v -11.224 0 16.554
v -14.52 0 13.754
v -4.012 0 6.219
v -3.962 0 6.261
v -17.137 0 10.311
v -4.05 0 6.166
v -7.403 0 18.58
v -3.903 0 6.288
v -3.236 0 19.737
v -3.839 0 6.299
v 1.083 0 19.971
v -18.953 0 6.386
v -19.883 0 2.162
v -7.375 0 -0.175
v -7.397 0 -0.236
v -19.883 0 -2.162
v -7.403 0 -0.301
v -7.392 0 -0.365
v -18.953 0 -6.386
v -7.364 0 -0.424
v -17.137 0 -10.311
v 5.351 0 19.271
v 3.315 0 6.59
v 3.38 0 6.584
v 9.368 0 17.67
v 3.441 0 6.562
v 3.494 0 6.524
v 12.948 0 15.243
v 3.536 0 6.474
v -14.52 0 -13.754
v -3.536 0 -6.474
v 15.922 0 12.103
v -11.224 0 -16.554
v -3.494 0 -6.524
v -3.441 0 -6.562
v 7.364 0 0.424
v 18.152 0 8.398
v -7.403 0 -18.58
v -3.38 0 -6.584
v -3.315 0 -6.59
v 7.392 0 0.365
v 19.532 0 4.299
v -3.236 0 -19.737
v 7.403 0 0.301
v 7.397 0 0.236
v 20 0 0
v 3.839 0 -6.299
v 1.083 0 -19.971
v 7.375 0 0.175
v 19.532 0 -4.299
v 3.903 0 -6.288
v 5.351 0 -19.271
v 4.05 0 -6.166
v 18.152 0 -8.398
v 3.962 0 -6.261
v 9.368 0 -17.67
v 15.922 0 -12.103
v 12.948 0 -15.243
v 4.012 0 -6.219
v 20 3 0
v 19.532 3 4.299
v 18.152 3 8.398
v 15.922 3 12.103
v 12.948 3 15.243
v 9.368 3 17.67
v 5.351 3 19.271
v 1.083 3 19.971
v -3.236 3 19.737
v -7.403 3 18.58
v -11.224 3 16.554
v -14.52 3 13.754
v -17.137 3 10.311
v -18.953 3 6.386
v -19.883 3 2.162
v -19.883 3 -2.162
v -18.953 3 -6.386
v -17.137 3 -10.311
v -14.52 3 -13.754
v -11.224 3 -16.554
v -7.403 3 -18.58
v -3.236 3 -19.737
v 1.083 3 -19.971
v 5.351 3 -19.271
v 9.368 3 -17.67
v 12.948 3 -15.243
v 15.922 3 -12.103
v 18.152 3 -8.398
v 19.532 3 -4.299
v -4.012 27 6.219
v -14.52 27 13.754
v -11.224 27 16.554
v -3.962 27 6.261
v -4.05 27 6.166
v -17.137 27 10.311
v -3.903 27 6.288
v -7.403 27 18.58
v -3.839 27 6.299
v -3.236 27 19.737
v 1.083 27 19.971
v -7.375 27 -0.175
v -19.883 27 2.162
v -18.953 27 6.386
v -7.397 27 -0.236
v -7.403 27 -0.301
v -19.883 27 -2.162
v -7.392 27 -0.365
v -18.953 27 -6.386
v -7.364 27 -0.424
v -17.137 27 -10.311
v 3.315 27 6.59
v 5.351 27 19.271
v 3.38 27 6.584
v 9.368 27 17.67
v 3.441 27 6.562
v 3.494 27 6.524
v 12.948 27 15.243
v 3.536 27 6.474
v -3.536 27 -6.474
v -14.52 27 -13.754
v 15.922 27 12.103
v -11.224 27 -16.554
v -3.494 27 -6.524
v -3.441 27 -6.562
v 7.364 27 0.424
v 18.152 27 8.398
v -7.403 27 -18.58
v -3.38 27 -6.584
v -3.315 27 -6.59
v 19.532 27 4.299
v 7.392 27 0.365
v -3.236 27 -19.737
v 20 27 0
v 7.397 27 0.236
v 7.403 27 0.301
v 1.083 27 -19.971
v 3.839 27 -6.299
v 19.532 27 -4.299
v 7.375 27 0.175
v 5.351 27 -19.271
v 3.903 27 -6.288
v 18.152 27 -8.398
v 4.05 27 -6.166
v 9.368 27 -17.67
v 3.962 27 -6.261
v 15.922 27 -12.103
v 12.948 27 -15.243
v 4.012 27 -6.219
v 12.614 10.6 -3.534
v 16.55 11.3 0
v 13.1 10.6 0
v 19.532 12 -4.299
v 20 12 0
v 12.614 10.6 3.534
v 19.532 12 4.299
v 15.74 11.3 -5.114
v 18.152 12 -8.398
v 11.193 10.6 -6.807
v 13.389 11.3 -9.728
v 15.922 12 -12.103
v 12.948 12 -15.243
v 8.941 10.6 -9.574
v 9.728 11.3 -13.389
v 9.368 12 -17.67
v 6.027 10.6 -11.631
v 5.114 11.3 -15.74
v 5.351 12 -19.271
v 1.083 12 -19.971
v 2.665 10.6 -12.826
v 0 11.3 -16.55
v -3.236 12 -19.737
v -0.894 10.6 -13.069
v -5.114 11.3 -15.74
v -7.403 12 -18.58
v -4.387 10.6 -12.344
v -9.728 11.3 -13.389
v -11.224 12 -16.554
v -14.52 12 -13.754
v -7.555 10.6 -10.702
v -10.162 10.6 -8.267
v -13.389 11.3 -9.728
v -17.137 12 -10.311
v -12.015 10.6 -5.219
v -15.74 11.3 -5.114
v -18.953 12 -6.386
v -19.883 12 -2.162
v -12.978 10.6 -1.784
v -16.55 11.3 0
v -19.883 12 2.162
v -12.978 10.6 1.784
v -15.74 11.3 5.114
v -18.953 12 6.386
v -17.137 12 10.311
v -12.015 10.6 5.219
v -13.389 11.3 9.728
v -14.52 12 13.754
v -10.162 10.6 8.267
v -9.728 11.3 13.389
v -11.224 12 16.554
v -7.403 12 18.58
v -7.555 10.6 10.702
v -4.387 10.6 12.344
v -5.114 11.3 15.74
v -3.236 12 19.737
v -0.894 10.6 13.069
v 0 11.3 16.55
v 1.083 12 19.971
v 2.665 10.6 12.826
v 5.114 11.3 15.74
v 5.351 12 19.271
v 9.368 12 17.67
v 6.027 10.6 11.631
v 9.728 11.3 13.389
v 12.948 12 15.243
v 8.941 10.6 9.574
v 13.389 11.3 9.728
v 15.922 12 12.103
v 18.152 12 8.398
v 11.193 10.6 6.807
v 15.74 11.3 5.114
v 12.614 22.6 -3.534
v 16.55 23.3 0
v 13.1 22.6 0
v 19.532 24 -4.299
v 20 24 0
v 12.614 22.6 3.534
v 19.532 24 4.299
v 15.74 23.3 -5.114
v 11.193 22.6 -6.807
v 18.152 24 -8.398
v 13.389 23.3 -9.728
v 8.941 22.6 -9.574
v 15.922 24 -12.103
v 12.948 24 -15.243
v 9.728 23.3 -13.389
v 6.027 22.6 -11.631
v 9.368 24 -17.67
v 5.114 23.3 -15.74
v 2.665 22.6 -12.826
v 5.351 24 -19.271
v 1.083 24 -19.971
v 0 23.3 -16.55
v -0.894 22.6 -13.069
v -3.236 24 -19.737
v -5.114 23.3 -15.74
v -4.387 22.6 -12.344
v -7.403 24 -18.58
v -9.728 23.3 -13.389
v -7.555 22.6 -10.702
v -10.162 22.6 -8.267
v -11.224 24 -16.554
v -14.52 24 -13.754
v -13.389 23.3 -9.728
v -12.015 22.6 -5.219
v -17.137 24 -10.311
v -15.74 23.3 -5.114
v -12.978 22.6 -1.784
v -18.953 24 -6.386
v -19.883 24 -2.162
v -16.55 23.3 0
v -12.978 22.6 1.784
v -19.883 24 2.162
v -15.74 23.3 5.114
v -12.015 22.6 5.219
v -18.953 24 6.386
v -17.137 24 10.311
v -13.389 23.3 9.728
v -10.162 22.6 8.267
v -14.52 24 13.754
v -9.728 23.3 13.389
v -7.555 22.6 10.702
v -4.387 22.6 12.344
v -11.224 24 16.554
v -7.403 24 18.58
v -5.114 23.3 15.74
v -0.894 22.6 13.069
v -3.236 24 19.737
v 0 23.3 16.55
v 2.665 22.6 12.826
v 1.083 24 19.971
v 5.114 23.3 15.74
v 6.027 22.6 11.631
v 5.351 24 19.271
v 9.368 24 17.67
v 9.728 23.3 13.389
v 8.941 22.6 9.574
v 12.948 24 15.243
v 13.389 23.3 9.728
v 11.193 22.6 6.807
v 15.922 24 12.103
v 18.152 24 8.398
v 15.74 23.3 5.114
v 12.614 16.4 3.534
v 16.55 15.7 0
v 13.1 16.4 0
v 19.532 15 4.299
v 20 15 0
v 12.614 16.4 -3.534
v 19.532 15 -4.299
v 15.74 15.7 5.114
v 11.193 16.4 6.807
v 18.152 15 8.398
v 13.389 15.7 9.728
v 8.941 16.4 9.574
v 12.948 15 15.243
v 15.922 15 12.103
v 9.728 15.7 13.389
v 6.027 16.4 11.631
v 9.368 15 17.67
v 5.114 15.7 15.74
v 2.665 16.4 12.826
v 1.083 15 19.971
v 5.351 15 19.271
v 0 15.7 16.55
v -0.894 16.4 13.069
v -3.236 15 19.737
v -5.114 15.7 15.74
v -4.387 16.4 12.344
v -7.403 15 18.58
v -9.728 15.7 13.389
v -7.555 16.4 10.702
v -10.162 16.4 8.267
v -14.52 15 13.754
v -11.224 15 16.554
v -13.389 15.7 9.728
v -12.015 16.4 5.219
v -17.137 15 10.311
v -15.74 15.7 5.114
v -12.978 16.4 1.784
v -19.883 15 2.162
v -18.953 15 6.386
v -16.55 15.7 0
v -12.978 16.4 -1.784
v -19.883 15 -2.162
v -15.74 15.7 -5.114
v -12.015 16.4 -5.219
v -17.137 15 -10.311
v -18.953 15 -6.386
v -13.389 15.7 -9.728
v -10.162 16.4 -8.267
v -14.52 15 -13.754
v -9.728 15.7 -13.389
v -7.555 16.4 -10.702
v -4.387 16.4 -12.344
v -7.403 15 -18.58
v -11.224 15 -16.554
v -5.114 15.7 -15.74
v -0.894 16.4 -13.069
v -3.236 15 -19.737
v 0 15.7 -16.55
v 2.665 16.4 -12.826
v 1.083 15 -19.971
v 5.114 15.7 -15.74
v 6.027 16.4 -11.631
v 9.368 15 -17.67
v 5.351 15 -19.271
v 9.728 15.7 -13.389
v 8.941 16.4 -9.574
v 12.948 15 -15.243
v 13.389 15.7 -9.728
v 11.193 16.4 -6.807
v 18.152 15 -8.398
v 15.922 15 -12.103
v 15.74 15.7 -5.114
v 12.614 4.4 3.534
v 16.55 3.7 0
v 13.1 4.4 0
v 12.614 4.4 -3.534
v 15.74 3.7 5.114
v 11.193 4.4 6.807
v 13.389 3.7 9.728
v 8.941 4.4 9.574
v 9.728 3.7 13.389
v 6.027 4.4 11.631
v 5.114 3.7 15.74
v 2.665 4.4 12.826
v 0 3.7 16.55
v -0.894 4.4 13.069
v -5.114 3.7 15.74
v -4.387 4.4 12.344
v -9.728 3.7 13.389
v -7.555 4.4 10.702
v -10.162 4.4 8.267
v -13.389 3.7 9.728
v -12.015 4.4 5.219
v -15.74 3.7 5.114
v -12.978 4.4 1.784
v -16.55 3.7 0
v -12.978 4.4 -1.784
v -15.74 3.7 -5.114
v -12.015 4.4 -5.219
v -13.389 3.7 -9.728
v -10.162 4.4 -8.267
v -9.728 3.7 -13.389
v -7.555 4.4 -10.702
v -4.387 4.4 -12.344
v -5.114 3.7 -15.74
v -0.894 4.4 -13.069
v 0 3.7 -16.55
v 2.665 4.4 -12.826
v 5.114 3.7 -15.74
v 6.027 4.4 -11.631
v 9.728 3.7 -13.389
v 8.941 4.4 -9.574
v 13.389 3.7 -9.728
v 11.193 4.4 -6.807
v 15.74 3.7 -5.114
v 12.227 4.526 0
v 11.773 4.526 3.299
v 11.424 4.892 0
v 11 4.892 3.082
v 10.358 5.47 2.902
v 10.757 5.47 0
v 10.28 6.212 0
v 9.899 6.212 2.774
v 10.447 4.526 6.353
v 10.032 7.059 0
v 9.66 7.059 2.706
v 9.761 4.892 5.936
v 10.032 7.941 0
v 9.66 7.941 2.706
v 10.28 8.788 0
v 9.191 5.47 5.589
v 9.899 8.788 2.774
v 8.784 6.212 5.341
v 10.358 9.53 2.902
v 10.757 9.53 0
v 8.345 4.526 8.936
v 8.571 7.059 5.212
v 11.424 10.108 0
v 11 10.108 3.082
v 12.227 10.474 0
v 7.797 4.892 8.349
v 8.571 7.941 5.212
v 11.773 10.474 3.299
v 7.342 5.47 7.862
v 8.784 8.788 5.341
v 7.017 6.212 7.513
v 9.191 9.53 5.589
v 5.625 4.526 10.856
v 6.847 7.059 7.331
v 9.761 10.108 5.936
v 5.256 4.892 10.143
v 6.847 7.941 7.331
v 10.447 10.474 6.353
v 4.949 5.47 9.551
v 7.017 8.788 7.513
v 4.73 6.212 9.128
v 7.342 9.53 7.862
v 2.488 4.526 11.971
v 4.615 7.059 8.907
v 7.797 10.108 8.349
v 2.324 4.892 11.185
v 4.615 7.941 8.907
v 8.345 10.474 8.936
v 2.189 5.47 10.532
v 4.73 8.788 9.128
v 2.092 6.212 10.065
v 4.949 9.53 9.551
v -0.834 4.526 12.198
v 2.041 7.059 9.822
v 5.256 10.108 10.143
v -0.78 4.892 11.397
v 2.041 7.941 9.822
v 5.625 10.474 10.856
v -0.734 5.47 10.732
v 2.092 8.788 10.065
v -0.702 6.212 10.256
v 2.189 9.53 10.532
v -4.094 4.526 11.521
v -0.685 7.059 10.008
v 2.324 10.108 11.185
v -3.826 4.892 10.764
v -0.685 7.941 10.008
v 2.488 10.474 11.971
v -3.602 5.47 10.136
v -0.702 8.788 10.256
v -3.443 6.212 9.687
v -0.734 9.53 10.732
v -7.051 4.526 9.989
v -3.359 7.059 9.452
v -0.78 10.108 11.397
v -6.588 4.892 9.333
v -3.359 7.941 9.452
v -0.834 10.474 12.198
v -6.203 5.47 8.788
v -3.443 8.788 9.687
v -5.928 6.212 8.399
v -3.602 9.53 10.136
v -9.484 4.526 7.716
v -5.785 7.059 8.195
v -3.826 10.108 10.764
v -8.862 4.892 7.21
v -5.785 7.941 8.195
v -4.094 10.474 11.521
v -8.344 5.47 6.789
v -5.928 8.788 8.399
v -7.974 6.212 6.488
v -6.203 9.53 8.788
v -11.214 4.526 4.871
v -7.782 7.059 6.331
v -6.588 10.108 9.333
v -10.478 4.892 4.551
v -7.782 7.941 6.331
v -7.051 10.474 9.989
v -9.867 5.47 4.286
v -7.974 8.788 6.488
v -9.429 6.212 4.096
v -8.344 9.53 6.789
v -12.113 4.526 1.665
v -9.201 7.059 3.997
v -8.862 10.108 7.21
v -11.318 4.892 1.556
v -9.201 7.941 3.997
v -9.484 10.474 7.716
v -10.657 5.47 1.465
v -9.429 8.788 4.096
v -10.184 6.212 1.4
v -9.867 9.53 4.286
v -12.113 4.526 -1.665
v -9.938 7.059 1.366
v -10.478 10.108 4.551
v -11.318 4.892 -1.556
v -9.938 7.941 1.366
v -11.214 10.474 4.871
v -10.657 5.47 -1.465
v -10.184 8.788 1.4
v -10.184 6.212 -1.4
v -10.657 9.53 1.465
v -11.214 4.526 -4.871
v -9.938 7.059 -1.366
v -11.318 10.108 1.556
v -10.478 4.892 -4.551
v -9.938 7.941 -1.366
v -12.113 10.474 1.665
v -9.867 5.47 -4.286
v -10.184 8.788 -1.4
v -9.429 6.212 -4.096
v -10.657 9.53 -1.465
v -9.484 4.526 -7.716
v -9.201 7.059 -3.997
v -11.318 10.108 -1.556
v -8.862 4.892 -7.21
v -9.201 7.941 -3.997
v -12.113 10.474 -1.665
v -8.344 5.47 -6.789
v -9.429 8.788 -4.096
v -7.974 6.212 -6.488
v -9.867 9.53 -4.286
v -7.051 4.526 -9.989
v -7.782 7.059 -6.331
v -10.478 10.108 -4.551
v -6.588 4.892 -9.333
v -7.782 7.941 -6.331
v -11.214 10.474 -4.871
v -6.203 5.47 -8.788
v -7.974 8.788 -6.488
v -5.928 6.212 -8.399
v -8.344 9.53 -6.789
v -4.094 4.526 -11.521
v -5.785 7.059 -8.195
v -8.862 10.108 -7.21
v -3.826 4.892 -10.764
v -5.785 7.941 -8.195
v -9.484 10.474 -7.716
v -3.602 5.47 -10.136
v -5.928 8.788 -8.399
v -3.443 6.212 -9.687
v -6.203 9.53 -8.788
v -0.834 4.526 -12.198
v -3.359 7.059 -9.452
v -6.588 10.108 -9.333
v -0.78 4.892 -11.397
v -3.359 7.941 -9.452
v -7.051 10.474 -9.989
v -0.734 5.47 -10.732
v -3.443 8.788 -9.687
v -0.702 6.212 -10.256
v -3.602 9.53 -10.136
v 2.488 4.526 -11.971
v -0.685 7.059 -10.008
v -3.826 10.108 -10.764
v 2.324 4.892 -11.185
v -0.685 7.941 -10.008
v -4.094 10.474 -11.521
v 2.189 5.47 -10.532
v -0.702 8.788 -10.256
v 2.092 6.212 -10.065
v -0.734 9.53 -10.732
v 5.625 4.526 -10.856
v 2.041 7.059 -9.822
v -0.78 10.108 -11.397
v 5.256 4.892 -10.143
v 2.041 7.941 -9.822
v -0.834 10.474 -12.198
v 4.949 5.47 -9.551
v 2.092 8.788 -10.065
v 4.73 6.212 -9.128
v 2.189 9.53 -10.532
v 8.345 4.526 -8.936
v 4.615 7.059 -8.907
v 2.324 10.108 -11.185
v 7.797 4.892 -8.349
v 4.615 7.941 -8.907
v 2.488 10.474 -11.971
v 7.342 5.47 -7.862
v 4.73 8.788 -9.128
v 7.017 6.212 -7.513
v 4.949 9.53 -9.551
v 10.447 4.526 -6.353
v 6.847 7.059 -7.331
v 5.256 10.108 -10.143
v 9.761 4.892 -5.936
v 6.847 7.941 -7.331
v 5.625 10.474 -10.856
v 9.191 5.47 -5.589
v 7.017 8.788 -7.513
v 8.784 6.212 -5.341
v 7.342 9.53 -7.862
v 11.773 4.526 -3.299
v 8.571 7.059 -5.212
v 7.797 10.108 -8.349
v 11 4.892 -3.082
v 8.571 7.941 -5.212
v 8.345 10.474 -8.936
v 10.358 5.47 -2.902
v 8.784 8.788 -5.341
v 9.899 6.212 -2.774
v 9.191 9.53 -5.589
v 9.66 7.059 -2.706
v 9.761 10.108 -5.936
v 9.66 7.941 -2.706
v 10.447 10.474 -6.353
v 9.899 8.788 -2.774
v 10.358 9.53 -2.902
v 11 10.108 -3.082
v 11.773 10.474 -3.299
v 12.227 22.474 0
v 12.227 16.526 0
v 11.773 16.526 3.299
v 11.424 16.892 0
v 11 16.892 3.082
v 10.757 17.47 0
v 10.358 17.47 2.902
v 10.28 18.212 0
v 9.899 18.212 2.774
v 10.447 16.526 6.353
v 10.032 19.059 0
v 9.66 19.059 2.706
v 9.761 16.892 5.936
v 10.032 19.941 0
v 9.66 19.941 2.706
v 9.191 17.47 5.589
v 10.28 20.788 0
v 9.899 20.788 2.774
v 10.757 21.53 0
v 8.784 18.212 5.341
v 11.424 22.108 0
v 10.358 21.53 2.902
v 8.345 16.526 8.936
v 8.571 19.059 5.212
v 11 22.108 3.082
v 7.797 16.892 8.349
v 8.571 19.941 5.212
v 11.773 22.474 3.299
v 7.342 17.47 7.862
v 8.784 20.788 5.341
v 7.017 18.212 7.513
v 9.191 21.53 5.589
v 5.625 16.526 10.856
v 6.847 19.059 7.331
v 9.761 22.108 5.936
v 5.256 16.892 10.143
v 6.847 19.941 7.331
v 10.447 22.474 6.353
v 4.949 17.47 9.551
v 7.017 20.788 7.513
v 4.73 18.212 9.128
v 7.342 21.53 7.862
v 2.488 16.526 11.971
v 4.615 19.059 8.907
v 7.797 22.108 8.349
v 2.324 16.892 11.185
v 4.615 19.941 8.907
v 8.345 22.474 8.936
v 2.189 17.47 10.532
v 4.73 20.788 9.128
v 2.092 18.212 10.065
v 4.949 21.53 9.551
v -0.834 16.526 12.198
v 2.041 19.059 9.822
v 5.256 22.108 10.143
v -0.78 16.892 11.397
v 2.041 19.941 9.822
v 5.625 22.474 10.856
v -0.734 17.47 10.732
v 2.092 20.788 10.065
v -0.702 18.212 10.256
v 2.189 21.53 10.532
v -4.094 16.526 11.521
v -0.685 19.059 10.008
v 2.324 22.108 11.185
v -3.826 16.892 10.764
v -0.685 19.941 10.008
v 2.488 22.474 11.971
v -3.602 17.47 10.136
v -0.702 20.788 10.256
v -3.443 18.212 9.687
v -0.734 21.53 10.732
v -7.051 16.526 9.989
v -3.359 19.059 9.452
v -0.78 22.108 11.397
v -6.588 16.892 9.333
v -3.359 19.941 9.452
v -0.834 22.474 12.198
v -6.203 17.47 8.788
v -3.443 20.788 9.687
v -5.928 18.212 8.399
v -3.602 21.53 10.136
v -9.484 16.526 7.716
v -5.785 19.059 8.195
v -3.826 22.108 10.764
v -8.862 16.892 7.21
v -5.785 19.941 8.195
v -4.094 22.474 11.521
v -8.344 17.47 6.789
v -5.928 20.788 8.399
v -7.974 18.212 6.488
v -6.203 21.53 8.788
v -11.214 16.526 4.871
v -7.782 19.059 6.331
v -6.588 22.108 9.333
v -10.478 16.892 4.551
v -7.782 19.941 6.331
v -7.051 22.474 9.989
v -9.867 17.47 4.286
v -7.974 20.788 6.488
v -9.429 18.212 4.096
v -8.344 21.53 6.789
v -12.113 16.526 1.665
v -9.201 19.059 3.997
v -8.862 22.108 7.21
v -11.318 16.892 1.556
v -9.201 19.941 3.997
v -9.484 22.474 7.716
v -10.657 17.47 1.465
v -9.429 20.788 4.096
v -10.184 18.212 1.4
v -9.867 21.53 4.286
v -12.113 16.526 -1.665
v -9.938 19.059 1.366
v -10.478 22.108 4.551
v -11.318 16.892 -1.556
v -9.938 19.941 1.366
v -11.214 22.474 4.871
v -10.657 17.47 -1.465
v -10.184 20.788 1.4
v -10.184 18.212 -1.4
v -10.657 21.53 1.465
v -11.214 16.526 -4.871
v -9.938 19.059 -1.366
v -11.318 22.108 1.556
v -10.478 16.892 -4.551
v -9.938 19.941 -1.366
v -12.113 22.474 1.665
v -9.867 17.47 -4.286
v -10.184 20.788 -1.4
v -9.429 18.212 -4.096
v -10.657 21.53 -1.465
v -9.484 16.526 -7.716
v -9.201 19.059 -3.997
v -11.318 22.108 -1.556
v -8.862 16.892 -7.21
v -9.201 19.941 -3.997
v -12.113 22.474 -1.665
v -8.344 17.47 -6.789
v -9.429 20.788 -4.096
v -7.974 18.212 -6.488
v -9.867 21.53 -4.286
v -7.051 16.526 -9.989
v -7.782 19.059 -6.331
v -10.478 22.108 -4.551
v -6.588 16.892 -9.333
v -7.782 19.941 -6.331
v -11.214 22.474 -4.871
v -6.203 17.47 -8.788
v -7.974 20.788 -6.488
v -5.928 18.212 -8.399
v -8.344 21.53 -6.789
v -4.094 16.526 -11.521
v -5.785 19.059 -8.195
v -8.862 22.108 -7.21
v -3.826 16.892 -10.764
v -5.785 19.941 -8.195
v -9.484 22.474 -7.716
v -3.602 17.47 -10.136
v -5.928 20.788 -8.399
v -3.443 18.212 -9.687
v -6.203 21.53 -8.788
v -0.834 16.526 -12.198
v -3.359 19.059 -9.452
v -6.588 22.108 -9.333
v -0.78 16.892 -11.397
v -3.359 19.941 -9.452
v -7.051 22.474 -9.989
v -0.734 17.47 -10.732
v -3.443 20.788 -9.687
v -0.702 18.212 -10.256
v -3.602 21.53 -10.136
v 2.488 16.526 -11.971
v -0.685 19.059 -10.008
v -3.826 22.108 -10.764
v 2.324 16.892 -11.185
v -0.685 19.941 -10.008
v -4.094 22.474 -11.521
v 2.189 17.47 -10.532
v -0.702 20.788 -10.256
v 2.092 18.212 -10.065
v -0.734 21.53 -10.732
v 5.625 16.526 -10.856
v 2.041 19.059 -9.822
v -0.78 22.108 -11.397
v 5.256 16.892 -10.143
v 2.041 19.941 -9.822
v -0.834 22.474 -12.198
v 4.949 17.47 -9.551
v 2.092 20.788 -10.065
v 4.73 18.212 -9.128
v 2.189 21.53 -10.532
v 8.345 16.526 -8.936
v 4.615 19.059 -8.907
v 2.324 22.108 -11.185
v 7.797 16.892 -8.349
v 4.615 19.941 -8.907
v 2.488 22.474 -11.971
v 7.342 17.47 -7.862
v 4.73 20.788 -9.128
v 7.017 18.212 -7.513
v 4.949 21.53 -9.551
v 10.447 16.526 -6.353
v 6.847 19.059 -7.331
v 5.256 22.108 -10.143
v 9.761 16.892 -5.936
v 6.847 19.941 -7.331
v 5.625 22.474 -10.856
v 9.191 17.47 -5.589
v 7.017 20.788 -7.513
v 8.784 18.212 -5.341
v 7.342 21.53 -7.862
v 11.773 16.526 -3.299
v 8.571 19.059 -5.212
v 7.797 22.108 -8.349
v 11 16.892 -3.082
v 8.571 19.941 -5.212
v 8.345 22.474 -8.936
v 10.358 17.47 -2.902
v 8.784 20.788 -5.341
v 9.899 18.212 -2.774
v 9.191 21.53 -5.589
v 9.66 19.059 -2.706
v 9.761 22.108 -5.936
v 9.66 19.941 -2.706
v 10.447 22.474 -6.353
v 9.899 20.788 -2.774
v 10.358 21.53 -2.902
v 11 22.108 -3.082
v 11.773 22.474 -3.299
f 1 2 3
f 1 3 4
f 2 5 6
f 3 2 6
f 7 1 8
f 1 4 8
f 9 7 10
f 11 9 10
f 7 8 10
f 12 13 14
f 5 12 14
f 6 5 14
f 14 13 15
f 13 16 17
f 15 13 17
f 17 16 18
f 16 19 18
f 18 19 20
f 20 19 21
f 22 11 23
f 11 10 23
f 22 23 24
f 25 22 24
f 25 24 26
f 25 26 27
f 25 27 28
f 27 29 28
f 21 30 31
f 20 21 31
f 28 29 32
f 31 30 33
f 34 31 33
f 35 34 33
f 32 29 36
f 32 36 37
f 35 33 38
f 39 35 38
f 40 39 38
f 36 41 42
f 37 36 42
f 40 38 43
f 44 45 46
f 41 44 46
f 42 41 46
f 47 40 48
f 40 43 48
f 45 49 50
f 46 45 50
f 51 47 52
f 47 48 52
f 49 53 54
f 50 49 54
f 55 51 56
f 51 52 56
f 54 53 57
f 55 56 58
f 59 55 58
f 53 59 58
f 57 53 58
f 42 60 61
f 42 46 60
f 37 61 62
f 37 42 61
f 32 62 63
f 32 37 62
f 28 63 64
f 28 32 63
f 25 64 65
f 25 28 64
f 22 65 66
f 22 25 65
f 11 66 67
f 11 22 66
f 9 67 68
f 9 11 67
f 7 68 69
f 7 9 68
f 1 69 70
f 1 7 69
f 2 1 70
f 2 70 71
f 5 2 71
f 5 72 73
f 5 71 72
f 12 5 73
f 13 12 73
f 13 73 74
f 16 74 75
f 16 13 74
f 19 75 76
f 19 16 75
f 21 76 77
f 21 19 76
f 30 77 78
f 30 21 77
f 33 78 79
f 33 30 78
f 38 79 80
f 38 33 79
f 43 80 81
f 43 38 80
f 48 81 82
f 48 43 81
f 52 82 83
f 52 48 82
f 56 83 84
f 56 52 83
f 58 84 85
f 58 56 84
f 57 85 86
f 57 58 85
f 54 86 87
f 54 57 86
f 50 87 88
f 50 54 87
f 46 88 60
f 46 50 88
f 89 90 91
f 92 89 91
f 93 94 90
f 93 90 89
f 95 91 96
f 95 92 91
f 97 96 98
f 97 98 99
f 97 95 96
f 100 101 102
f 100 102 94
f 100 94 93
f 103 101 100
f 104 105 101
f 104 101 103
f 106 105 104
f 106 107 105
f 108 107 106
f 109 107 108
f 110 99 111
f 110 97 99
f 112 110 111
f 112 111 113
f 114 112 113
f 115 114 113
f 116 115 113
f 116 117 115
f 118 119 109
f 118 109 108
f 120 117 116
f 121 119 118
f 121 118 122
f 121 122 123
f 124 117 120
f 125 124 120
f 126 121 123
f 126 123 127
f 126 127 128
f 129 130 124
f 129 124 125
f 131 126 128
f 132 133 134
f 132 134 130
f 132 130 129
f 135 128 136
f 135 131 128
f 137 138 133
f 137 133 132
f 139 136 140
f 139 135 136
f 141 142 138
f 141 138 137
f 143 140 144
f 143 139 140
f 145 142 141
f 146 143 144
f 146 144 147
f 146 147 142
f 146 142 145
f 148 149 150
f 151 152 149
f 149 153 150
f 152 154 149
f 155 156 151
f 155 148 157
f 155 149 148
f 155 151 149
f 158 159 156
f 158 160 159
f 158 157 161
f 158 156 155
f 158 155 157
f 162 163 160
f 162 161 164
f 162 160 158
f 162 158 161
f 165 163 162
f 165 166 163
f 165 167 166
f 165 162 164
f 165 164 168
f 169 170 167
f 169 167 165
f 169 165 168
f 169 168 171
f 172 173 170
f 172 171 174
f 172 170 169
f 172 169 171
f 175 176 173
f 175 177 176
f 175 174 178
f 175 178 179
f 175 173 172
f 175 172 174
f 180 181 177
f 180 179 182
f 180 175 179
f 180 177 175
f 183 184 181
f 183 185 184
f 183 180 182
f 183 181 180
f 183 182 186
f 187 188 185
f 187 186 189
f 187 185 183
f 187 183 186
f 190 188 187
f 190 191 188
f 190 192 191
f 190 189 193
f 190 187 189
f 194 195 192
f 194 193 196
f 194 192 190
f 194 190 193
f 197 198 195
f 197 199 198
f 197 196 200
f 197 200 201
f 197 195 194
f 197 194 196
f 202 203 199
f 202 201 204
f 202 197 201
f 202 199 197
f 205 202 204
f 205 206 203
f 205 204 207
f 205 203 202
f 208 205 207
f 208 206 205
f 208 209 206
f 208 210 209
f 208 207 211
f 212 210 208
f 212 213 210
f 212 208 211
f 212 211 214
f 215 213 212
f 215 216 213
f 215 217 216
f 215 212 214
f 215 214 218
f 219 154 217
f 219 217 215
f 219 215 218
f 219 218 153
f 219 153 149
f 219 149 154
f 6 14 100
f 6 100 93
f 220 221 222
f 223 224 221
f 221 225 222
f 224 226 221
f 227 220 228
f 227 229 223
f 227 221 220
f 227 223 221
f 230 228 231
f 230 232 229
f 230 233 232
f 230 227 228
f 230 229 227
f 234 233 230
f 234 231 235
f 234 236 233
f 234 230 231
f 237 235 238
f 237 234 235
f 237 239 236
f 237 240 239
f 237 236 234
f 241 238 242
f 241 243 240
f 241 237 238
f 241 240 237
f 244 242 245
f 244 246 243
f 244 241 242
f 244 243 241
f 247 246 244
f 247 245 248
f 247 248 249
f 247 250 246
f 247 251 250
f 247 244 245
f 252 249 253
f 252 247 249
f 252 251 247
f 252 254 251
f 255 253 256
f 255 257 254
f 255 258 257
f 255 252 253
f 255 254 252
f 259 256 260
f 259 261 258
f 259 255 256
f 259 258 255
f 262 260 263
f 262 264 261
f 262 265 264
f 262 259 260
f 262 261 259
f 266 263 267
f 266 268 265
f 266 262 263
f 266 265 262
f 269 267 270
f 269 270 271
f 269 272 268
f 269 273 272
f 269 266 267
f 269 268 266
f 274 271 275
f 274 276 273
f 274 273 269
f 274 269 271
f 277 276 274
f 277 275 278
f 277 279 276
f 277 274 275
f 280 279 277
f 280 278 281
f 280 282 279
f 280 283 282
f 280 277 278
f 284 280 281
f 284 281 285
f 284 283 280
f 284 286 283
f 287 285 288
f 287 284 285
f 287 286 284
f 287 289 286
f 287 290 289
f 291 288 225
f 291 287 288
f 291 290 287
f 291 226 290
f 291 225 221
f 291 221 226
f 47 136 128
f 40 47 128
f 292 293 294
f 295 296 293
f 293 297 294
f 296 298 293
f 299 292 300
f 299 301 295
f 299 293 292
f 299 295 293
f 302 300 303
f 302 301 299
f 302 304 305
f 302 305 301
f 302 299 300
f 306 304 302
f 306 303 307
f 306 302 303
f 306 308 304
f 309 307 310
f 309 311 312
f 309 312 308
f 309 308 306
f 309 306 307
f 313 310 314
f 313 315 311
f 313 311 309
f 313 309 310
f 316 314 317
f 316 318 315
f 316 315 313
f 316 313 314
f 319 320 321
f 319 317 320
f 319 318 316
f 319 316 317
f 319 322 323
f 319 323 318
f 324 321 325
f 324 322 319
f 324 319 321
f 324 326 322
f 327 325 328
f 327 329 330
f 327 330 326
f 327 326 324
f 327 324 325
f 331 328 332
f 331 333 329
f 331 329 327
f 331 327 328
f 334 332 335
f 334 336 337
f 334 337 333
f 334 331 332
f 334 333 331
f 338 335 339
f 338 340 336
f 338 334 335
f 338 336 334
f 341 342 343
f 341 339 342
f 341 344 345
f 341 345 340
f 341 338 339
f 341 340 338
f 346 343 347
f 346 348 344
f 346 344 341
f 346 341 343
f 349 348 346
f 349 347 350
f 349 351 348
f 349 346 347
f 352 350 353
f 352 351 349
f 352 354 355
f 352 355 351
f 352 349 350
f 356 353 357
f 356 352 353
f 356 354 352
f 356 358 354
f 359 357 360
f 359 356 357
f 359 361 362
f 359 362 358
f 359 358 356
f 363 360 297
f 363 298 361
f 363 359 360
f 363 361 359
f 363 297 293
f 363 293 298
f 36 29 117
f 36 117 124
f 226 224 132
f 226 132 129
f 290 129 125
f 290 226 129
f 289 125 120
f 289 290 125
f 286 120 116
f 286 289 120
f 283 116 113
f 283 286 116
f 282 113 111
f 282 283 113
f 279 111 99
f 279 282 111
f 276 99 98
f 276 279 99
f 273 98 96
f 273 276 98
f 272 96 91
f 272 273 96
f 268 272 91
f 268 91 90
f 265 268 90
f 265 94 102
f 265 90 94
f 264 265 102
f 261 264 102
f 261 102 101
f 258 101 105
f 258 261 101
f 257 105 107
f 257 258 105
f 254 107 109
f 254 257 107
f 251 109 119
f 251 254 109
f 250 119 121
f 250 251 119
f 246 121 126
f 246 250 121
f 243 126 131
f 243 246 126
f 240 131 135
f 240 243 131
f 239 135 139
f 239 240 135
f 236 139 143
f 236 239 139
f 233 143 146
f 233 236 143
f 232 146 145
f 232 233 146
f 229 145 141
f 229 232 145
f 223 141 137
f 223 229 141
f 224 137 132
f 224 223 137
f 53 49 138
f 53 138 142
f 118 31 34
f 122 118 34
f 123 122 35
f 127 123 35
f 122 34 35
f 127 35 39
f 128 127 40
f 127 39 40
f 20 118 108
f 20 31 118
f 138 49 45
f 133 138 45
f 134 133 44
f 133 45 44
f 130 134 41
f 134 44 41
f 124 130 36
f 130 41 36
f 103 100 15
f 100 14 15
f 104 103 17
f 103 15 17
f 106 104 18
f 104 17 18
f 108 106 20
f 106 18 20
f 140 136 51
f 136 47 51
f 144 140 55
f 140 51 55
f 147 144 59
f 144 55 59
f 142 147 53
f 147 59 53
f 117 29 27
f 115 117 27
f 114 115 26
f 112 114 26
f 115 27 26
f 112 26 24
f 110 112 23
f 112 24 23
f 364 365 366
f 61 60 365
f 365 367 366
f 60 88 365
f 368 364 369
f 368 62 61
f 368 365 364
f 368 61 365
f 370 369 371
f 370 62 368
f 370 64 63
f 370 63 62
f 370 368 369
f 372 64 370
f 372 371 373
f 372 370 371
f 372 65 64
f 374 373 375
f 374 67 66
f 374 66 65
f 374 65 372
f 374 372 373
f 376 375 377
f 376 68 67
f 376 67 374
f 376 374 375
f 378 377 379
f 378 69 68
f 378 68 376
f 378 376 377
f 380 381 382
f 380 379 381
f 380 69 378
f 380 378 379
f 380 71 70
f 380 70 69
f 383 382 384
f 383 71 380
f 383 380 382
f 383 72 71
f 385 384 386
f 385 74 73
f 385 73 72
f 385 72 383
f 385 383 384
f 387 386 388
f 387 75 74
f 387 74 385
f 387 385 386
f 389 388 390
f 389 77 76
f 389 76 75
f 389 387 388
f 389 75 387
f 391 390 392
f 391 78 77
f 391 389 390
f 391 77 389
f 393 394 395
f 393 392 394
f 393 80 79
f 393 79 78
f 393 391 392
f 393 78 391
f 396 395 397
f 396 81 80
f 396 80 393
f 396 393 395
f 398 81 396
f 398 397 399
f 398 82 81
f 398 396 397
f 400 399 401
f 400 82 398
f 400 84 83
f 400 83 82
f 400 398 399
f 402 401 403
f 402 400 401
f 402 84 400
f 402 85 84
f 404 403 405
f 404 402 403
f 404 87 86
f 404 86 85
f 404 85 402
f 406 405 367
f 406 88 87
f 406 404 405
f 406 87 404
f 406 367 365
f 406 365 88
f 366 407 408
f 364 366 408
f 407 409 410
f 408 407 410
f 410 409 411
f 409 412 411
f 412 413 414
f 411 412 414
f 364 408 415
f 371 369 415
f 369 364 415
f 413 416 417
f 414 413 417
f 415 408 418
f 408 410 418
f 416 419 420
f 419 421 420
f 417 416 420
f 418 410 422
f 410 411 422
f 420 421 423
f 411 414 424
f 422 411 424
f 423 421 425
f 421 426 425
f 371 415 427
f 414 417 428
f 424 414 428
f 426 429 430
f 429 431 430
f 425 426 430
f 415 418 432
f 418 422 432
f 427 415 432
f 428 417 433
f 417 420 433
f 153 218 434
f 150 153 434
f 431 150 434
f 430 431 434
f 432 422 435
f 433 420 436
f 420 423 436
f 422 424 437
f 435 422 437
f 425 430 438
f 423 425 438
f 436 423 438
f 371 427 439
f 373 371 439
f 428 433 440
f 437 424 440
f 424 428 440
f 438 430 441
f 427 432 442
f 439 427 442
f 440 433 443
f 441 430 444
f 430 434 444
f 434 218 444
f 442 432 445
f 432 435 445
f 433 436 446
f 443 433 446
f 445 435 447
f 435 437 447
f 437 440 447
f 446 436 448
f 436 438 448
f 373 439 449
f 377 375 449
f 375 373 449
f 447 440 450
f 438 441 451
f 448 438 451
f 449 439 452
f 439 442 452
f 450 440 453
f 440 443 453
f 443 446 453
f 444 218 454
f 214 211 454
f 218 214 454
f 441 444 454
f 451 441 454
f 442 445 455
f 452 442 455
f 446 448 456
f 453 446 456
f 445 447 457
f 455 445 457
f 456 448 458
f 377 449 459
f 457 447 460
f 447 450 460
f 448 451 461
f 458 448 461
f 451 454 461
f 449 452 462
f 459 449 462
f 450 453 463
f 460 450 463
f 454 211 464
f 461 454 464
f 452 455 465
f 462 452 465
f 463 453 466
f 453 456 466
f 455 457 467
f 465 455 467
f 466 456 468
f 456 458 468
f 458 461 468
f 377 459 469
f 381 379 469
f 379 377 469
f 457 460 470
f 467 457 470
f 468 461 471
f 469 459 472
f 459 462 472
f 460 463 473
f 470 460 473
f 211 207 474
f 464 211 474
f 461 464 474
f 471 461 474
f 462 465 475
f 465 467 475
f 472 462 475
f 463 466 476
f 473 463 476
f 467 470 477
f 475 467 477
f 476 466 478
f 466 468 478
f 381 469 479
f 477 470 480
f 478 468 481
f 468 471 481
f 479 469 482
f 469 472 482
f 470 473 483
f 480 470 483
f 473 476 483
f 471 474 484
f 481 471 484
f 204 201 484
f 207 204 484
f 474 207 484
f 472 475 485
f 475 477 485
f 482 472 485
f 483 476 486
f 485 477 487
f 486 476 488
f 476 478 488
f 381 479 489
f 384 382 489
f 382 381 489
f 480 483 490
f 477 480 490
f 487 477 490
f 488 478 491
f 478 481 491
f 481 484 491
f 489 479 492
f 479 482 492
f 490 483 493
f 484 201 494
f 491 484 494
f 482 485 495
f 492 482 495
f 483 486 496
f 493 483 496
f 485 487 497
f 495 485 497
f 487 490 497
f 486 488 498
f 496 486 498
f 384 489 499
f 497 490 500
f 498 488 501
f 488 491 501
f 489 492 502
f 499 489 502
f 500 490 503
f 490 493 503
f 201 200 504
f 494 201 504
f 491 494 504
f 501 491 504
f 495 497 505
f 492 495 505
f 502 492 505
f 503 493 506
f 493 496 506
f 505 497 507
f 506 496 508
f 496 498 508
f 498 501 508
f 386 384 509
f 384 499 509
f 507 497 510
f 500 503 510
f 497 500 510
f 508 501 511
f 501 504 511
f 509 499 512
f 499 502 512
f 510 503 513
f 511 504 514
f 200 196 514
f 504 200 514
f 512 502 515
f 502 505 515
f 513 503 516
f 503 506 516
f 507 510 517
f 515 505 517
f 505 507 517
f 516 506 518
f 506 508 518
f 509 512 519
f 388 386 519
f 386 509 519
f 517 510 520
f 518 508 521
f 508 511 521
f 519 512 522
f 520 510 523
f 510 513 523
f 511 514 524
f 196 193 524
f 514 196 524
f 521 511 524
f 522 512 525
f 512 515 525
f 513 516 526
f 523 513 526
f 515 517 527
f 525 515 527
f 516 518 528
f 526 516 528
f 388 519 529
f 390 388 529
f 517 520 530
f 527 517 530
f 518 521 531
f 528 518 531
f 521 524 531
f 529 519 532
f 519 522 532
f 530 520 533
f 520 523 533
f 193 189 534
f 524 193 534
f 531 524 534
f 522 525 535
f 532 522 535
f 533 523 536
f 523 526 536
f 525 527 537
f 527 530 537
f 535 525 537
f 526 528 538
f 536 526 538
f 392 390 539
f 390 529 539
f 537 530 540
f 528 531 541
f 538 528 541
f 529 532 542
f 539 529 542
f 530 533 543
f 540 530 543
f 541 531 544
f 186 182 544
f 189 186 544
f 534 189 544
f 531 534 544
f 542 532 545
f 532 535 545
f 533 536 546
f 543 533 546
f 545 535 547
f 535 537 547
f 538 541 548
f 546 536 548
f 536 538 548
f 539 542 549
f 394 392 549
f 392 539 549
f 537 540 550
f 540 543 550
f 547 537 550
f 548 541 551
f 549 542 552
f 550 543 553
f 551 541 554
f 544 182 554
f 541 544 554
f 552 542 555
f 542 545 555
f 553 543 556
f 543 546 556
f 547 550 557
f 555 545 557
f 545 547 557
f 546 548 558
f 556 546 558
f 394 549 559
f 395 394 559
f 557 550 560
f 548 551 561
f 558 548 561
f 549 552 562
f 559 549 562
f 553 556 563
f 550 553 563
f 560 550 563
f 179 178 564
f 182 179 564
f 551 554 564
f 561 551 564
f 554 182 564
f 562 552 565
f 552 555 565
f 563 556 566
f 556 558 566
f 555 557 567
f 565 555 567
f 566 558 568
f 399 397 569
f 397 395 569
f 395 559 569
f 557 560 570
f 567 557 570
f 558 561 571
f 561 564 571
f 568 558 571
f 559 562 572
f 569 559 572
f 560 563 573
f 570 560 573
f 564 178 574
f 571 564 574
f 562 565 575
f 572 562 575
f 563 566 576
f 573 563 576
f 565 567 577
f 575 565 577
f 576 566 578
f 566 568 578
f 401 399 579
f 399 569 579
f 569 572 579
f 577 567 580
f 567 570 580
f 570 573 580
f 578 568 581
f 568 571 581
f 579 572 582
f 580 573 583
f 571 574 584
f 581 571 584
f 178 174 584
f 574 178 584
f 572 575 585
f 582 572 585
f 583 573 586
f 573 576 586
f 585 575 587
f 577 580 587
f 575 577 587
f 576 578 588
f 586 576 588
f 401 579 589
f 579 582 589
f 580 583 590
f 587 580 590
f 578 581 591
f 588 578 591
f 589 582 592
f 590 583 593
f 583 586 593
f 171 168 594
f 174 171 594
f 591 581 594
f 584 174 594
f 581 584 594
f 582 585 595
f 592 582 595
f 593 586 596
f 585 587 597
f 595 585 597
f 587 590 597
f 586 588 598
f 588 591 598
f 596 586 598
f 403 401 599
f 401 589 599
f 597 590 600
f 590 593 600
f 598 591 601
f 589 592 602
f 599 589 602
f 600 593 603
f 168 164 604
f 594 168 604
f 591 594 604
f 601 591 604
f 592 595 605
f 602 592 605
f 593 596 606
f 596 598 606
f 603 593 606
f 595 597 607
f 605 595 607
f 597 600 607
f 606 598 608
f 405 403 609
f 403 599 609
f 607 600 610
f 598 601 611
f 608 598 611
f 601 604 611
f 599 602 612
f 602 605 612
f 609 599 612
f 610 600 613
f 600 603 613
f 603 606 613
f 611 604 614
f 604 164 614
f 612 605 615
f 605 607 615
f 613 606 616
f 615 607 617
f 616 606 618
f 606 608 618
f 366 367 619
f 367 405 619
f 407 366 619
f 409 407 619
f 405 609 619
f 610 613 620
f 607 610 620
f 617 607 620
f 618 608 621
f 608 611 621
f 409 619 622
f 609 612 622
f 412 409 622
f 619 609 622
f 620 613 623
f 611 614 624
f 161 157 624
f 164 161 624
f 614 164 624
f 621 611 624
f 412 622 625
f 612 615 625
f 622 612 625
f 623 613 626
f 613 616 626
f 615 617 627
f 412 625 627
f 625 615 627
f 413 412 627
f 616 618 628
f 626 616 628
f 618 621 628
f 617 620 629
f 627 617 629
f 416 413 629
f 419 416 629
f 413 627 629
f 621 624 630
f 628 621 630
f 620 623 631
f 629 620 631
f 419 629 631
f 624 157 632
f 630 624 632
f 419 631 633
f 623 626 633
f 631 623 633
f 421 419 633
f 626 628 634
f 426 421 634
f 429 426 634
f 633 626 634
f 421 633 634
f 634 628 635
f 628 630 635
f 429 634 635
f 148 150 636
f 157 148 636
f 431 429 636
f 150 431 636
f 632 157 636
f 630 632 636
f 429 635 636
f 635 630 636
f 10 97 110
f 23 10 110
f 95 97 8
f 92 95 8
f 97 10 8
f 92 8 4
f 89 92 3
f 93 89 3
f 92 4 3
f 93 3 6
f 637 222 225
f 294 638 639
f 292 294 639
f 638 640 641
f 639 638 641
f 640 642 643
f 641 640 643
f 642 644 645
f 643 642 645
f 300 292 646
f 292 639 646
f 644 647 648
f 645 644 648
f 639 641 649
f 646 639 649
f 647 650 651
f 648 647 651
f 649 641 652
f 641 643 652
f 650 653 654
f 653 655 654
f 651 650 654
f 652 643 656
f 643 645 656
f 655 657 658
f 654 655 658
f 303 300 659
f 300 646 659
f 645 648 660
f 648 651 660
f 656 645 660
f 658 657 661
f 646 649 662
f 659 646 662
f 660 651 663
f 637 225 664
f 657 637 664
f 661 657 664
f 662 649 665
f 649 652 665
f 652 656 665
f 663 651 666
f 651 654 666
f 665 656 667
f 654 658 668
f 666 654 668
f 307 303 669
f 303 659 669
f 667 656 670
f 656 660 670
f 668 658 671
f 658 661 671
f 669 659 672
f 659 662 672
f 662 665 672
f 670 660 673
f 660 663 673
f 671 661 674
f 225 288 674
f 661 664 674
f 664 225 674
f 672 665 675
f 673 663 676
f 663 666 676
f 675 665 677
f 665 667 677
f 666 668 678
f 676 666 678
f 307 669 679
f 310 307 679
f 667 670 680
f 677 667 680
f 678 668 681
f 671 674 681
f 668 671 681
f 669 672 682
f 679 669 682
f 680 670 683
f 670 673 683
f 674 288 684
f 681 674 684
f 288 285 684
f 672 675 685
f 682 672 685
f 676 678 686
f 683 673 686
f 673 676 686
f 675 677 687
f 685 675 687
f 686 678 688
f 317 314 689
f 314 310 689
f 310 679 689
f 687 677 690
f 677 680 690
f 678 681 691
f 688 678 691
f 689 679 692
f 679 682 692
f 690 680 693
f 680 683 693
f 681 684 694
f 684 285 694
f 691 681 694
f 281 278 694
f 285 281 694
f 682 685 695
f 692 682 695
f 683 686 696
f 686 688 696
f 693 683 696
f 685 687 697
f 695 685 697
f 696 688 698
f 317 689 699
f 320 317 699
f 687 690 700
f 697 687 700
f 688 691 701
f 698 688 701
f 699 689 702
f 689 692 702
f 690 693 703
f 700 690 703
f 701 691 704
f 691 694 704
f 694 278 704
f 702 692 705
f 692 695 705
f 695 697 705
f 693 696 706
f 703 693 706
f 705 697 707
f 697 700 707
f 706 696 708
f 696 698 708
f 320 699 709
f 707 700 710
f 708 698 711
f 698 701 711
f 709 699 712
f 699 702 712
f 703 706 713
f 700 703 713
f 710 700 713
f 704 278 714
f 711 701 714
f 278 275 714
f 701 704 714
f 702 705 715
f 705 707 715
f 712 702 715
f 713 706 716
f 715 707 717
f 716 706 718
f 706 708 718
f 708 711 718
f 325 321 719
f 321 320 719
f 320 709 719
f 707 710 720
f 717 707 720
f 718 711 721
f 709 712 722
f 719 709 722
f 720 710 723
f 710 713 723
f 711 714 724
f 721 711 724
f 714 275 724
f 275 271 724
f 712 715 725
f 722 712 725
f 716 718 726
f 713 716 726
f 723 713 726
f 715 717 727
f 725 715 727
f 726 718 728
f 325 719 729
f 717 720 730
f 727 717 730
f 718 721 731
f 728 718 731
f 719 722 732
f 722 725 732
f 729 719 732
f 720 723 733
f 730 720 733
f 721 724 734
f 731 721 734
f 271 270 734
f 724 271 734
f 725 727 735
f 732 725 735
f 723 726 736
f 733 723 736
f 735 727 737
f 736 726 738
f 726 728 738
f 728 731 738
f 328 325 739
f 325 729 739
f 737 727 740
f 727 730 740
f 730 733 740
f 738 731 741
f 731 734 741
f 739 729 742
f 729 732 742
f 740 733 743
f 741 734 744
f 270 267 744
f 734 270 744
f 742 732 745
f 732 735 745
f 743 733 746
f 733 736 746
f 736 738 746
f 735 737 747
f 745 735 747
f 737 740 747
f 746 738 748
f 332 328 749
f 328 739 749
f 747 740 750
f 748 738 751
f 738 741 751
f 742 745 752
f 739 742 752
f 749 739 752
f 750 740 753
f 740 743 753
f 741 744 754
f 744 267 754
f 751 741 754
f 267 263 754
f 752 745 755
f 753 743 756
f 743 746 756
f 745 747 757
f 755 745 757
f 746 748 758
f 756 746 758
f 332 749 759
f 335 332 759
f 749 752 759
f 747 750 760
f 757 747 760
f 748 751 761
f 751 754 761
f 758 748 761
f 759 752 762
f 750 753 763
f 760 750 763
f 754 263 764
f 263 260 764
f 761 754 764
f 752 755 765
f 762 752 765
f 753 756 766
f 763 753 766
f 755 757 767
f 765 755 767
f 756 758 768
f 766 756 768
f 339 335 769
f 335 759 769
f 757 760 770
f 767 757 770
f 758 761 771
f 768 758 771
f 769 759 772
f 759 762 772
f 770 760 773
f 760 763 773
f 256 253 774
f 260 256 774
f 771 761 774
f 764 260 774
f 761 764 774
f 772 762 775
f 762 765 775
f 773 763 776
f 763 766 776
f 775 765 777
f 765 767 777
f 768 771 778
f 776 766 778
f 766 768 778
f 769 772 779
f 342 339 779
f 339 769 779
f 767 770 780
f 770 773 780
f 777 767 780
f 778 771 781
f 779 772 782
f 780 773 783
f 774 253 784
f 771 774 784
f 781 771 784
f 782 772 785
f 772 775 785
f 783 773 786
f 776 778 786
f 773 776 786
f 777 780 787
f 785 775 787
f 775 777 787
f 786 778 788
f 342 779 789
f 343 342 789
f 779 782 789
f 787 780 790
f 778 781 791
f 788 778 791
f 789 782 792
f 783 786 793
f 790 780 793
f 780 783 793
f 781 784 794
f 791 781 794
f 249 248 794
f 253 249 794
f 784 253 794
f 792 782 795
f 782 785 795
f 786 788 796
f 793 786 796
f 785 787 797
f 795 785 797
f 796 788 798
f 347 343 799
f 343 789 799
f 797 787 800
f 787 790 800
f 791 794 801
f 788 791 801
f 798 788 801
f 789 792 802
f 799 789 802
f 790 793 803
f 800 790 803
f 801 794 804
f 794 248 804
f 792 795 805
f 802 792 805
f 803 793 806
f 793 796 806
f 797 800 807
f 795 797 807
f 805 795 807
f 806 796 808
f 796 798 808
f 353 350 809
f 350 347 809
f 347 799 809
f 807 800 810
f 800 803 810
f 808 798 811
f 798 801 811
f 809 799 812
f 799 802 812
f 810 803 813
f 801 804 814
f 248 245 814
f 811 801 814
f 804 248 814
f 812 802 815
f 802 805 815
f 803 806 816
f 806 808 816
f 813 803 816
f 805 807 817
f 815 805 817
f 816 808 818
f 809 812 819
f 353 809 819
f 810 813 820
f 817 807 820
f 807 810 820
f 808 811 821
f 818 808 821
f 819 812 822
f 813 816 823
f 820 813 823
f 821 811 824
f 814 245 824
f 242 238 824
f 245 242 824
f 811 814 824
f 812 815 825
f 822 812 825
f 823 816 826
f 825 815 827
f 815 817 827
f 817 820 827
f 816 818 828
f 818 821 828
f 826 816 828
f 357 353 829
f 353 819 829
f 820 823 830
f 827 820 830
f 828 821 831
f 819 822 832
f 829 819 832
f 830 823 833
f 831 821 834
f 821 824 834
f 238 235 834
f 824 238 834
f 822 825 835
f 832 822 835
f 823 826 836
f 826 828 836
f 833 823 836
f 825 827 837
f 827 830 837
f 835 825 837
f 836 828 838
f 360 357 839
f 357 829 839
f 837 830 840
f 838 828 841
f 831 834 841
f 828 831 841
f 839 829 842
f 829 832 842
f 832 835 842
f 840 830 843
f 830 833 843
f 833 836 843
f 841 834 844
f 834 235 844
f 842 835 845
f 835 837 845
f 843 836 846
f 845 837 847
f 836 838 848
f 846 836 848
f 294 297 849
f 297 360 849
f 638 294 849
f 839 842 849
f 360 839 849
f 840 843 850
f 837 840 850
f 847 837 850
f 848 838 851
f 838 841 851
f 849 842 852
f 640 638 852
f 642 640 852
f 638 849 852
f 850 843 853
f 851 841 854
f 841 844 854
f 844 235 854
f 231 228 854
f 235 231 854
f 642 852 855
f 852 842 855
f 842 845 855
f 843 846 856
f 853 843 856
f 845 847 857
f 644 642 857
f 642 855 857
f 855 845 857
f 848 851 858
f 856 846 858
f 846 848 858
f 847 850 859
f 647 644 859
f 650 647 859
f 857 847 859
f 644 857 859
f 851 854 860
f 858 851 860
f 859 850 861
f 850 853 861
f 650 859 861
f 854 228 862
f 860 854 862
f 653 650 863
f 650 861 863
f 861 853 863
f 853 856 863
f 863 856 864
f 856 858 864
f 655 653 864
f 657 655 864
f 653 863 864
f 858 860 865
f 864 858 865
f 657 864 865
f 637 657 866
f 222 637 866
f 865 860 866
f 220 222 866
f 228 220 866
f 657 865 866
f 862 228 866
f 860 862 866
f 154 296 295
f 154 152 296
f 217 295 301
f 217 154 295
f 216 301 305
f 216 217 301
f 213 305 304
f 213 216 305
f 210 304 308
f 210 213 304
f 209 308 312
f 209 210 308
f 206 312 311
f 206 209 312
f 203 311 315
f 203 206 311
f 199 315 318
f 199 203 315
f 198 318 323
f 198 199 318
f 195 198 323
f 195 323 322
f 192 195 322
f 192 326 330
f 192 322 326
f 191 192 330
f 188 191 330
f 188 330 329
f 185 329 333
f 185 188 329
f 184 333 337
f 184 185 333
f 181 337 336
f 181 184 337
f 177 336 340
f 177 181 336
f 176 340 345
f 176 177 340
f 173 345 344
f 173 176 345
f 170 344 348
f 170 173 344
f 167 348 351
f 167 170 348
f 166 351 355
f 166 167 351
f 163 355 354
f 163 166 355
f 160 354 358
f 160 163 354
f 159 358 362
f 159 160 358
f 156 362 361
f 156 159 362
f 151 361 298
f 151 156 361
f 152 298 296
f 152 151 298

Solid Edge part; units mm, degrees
sketch "Sketch1" plane through (0, 0, 0) normal (0, 0, 1) x (1, 0, 0)
  line L0 (0, 27) -> (20, 27)
  line L1 (20, 27) -> (20, 24)
  line L2 (13.1, 22.6) -> (20, 24)
  line L3 (13.1, 16.4) -> (20, 15)
  line L4 (20, 15) -> (20, 12)
  line L5 (13.1, 10.6) -> (20, 12)
  line L6 (13.1, 4.4) -> (20, 3)
  line L7 (20, 3) -> (20, 0)
  line L8 (20, 0) -> (0, 0)
  line L9 (0, 0) -> (0, 27)
  arc A0 (13.1, 16.4) -> (13.1, 22.6) centre (13.1, 19.5) cw
  arc A1 (13.1, 4.4) -> (13.1, 10.6) centre (13.1, 7.5) cw
revolve "RevolvedProtrusion1" add sketch "Sketch1" angle 360 about axis through (0, 0, 0) along (0, 1, 0)
sketch "Sketch2" plane through (0, 27, 0) normal (0, 1, 0) x (1, 0, 0)
  line L0 (3.8386, 6.2993) -> (-3.3146, 6.5901)
  arc A0 (-3.3146, 6.5901) -> (-3.536, 6.474) centre (-3.3248, 6.3403) ccw
  line L1 (-3.536, 6.474) -> (-7.3645, 0.4245)
  arc A1 (-7.3645, 0.4245) -> (-7.3746, 0.1747) centre (-7.1532, 0.2908) ccw
  line L2 (-7.3746, 0.1747) -> (-4.0499, -6.1656)
  arc A2 (-3.8386, -6.2993) -> (-4.0499, -6.1656) centre (-3.8285, -6.0495) cw
  line L3 (-3.8386, -6.2993) -> (3.3146, -6.5901)
  arc A3 (3.3146, -6.5901) -> (3.536, -6.474) centre (3.3248, -6.3403) ccw
  line L4 (3.536, -6.474) -> (7.3645, -0.4245)
  arc A4 (7.3645, -0.4245) -> (7.3746, -0.1747) centre (7.1532, -0.2908) ccw
  line L5 (7.3746, -0.1747) -> (4.0499, 6.1656)
  arc A5 (4.0499, 6.1656) -> (3.8386, 6.2993) centre (3.8285, 6.0495) ccw
extrude "Cutout1" cut sketch "Sketch2" along normal through all and the other way through all
properties part number "BumbleB0507"
